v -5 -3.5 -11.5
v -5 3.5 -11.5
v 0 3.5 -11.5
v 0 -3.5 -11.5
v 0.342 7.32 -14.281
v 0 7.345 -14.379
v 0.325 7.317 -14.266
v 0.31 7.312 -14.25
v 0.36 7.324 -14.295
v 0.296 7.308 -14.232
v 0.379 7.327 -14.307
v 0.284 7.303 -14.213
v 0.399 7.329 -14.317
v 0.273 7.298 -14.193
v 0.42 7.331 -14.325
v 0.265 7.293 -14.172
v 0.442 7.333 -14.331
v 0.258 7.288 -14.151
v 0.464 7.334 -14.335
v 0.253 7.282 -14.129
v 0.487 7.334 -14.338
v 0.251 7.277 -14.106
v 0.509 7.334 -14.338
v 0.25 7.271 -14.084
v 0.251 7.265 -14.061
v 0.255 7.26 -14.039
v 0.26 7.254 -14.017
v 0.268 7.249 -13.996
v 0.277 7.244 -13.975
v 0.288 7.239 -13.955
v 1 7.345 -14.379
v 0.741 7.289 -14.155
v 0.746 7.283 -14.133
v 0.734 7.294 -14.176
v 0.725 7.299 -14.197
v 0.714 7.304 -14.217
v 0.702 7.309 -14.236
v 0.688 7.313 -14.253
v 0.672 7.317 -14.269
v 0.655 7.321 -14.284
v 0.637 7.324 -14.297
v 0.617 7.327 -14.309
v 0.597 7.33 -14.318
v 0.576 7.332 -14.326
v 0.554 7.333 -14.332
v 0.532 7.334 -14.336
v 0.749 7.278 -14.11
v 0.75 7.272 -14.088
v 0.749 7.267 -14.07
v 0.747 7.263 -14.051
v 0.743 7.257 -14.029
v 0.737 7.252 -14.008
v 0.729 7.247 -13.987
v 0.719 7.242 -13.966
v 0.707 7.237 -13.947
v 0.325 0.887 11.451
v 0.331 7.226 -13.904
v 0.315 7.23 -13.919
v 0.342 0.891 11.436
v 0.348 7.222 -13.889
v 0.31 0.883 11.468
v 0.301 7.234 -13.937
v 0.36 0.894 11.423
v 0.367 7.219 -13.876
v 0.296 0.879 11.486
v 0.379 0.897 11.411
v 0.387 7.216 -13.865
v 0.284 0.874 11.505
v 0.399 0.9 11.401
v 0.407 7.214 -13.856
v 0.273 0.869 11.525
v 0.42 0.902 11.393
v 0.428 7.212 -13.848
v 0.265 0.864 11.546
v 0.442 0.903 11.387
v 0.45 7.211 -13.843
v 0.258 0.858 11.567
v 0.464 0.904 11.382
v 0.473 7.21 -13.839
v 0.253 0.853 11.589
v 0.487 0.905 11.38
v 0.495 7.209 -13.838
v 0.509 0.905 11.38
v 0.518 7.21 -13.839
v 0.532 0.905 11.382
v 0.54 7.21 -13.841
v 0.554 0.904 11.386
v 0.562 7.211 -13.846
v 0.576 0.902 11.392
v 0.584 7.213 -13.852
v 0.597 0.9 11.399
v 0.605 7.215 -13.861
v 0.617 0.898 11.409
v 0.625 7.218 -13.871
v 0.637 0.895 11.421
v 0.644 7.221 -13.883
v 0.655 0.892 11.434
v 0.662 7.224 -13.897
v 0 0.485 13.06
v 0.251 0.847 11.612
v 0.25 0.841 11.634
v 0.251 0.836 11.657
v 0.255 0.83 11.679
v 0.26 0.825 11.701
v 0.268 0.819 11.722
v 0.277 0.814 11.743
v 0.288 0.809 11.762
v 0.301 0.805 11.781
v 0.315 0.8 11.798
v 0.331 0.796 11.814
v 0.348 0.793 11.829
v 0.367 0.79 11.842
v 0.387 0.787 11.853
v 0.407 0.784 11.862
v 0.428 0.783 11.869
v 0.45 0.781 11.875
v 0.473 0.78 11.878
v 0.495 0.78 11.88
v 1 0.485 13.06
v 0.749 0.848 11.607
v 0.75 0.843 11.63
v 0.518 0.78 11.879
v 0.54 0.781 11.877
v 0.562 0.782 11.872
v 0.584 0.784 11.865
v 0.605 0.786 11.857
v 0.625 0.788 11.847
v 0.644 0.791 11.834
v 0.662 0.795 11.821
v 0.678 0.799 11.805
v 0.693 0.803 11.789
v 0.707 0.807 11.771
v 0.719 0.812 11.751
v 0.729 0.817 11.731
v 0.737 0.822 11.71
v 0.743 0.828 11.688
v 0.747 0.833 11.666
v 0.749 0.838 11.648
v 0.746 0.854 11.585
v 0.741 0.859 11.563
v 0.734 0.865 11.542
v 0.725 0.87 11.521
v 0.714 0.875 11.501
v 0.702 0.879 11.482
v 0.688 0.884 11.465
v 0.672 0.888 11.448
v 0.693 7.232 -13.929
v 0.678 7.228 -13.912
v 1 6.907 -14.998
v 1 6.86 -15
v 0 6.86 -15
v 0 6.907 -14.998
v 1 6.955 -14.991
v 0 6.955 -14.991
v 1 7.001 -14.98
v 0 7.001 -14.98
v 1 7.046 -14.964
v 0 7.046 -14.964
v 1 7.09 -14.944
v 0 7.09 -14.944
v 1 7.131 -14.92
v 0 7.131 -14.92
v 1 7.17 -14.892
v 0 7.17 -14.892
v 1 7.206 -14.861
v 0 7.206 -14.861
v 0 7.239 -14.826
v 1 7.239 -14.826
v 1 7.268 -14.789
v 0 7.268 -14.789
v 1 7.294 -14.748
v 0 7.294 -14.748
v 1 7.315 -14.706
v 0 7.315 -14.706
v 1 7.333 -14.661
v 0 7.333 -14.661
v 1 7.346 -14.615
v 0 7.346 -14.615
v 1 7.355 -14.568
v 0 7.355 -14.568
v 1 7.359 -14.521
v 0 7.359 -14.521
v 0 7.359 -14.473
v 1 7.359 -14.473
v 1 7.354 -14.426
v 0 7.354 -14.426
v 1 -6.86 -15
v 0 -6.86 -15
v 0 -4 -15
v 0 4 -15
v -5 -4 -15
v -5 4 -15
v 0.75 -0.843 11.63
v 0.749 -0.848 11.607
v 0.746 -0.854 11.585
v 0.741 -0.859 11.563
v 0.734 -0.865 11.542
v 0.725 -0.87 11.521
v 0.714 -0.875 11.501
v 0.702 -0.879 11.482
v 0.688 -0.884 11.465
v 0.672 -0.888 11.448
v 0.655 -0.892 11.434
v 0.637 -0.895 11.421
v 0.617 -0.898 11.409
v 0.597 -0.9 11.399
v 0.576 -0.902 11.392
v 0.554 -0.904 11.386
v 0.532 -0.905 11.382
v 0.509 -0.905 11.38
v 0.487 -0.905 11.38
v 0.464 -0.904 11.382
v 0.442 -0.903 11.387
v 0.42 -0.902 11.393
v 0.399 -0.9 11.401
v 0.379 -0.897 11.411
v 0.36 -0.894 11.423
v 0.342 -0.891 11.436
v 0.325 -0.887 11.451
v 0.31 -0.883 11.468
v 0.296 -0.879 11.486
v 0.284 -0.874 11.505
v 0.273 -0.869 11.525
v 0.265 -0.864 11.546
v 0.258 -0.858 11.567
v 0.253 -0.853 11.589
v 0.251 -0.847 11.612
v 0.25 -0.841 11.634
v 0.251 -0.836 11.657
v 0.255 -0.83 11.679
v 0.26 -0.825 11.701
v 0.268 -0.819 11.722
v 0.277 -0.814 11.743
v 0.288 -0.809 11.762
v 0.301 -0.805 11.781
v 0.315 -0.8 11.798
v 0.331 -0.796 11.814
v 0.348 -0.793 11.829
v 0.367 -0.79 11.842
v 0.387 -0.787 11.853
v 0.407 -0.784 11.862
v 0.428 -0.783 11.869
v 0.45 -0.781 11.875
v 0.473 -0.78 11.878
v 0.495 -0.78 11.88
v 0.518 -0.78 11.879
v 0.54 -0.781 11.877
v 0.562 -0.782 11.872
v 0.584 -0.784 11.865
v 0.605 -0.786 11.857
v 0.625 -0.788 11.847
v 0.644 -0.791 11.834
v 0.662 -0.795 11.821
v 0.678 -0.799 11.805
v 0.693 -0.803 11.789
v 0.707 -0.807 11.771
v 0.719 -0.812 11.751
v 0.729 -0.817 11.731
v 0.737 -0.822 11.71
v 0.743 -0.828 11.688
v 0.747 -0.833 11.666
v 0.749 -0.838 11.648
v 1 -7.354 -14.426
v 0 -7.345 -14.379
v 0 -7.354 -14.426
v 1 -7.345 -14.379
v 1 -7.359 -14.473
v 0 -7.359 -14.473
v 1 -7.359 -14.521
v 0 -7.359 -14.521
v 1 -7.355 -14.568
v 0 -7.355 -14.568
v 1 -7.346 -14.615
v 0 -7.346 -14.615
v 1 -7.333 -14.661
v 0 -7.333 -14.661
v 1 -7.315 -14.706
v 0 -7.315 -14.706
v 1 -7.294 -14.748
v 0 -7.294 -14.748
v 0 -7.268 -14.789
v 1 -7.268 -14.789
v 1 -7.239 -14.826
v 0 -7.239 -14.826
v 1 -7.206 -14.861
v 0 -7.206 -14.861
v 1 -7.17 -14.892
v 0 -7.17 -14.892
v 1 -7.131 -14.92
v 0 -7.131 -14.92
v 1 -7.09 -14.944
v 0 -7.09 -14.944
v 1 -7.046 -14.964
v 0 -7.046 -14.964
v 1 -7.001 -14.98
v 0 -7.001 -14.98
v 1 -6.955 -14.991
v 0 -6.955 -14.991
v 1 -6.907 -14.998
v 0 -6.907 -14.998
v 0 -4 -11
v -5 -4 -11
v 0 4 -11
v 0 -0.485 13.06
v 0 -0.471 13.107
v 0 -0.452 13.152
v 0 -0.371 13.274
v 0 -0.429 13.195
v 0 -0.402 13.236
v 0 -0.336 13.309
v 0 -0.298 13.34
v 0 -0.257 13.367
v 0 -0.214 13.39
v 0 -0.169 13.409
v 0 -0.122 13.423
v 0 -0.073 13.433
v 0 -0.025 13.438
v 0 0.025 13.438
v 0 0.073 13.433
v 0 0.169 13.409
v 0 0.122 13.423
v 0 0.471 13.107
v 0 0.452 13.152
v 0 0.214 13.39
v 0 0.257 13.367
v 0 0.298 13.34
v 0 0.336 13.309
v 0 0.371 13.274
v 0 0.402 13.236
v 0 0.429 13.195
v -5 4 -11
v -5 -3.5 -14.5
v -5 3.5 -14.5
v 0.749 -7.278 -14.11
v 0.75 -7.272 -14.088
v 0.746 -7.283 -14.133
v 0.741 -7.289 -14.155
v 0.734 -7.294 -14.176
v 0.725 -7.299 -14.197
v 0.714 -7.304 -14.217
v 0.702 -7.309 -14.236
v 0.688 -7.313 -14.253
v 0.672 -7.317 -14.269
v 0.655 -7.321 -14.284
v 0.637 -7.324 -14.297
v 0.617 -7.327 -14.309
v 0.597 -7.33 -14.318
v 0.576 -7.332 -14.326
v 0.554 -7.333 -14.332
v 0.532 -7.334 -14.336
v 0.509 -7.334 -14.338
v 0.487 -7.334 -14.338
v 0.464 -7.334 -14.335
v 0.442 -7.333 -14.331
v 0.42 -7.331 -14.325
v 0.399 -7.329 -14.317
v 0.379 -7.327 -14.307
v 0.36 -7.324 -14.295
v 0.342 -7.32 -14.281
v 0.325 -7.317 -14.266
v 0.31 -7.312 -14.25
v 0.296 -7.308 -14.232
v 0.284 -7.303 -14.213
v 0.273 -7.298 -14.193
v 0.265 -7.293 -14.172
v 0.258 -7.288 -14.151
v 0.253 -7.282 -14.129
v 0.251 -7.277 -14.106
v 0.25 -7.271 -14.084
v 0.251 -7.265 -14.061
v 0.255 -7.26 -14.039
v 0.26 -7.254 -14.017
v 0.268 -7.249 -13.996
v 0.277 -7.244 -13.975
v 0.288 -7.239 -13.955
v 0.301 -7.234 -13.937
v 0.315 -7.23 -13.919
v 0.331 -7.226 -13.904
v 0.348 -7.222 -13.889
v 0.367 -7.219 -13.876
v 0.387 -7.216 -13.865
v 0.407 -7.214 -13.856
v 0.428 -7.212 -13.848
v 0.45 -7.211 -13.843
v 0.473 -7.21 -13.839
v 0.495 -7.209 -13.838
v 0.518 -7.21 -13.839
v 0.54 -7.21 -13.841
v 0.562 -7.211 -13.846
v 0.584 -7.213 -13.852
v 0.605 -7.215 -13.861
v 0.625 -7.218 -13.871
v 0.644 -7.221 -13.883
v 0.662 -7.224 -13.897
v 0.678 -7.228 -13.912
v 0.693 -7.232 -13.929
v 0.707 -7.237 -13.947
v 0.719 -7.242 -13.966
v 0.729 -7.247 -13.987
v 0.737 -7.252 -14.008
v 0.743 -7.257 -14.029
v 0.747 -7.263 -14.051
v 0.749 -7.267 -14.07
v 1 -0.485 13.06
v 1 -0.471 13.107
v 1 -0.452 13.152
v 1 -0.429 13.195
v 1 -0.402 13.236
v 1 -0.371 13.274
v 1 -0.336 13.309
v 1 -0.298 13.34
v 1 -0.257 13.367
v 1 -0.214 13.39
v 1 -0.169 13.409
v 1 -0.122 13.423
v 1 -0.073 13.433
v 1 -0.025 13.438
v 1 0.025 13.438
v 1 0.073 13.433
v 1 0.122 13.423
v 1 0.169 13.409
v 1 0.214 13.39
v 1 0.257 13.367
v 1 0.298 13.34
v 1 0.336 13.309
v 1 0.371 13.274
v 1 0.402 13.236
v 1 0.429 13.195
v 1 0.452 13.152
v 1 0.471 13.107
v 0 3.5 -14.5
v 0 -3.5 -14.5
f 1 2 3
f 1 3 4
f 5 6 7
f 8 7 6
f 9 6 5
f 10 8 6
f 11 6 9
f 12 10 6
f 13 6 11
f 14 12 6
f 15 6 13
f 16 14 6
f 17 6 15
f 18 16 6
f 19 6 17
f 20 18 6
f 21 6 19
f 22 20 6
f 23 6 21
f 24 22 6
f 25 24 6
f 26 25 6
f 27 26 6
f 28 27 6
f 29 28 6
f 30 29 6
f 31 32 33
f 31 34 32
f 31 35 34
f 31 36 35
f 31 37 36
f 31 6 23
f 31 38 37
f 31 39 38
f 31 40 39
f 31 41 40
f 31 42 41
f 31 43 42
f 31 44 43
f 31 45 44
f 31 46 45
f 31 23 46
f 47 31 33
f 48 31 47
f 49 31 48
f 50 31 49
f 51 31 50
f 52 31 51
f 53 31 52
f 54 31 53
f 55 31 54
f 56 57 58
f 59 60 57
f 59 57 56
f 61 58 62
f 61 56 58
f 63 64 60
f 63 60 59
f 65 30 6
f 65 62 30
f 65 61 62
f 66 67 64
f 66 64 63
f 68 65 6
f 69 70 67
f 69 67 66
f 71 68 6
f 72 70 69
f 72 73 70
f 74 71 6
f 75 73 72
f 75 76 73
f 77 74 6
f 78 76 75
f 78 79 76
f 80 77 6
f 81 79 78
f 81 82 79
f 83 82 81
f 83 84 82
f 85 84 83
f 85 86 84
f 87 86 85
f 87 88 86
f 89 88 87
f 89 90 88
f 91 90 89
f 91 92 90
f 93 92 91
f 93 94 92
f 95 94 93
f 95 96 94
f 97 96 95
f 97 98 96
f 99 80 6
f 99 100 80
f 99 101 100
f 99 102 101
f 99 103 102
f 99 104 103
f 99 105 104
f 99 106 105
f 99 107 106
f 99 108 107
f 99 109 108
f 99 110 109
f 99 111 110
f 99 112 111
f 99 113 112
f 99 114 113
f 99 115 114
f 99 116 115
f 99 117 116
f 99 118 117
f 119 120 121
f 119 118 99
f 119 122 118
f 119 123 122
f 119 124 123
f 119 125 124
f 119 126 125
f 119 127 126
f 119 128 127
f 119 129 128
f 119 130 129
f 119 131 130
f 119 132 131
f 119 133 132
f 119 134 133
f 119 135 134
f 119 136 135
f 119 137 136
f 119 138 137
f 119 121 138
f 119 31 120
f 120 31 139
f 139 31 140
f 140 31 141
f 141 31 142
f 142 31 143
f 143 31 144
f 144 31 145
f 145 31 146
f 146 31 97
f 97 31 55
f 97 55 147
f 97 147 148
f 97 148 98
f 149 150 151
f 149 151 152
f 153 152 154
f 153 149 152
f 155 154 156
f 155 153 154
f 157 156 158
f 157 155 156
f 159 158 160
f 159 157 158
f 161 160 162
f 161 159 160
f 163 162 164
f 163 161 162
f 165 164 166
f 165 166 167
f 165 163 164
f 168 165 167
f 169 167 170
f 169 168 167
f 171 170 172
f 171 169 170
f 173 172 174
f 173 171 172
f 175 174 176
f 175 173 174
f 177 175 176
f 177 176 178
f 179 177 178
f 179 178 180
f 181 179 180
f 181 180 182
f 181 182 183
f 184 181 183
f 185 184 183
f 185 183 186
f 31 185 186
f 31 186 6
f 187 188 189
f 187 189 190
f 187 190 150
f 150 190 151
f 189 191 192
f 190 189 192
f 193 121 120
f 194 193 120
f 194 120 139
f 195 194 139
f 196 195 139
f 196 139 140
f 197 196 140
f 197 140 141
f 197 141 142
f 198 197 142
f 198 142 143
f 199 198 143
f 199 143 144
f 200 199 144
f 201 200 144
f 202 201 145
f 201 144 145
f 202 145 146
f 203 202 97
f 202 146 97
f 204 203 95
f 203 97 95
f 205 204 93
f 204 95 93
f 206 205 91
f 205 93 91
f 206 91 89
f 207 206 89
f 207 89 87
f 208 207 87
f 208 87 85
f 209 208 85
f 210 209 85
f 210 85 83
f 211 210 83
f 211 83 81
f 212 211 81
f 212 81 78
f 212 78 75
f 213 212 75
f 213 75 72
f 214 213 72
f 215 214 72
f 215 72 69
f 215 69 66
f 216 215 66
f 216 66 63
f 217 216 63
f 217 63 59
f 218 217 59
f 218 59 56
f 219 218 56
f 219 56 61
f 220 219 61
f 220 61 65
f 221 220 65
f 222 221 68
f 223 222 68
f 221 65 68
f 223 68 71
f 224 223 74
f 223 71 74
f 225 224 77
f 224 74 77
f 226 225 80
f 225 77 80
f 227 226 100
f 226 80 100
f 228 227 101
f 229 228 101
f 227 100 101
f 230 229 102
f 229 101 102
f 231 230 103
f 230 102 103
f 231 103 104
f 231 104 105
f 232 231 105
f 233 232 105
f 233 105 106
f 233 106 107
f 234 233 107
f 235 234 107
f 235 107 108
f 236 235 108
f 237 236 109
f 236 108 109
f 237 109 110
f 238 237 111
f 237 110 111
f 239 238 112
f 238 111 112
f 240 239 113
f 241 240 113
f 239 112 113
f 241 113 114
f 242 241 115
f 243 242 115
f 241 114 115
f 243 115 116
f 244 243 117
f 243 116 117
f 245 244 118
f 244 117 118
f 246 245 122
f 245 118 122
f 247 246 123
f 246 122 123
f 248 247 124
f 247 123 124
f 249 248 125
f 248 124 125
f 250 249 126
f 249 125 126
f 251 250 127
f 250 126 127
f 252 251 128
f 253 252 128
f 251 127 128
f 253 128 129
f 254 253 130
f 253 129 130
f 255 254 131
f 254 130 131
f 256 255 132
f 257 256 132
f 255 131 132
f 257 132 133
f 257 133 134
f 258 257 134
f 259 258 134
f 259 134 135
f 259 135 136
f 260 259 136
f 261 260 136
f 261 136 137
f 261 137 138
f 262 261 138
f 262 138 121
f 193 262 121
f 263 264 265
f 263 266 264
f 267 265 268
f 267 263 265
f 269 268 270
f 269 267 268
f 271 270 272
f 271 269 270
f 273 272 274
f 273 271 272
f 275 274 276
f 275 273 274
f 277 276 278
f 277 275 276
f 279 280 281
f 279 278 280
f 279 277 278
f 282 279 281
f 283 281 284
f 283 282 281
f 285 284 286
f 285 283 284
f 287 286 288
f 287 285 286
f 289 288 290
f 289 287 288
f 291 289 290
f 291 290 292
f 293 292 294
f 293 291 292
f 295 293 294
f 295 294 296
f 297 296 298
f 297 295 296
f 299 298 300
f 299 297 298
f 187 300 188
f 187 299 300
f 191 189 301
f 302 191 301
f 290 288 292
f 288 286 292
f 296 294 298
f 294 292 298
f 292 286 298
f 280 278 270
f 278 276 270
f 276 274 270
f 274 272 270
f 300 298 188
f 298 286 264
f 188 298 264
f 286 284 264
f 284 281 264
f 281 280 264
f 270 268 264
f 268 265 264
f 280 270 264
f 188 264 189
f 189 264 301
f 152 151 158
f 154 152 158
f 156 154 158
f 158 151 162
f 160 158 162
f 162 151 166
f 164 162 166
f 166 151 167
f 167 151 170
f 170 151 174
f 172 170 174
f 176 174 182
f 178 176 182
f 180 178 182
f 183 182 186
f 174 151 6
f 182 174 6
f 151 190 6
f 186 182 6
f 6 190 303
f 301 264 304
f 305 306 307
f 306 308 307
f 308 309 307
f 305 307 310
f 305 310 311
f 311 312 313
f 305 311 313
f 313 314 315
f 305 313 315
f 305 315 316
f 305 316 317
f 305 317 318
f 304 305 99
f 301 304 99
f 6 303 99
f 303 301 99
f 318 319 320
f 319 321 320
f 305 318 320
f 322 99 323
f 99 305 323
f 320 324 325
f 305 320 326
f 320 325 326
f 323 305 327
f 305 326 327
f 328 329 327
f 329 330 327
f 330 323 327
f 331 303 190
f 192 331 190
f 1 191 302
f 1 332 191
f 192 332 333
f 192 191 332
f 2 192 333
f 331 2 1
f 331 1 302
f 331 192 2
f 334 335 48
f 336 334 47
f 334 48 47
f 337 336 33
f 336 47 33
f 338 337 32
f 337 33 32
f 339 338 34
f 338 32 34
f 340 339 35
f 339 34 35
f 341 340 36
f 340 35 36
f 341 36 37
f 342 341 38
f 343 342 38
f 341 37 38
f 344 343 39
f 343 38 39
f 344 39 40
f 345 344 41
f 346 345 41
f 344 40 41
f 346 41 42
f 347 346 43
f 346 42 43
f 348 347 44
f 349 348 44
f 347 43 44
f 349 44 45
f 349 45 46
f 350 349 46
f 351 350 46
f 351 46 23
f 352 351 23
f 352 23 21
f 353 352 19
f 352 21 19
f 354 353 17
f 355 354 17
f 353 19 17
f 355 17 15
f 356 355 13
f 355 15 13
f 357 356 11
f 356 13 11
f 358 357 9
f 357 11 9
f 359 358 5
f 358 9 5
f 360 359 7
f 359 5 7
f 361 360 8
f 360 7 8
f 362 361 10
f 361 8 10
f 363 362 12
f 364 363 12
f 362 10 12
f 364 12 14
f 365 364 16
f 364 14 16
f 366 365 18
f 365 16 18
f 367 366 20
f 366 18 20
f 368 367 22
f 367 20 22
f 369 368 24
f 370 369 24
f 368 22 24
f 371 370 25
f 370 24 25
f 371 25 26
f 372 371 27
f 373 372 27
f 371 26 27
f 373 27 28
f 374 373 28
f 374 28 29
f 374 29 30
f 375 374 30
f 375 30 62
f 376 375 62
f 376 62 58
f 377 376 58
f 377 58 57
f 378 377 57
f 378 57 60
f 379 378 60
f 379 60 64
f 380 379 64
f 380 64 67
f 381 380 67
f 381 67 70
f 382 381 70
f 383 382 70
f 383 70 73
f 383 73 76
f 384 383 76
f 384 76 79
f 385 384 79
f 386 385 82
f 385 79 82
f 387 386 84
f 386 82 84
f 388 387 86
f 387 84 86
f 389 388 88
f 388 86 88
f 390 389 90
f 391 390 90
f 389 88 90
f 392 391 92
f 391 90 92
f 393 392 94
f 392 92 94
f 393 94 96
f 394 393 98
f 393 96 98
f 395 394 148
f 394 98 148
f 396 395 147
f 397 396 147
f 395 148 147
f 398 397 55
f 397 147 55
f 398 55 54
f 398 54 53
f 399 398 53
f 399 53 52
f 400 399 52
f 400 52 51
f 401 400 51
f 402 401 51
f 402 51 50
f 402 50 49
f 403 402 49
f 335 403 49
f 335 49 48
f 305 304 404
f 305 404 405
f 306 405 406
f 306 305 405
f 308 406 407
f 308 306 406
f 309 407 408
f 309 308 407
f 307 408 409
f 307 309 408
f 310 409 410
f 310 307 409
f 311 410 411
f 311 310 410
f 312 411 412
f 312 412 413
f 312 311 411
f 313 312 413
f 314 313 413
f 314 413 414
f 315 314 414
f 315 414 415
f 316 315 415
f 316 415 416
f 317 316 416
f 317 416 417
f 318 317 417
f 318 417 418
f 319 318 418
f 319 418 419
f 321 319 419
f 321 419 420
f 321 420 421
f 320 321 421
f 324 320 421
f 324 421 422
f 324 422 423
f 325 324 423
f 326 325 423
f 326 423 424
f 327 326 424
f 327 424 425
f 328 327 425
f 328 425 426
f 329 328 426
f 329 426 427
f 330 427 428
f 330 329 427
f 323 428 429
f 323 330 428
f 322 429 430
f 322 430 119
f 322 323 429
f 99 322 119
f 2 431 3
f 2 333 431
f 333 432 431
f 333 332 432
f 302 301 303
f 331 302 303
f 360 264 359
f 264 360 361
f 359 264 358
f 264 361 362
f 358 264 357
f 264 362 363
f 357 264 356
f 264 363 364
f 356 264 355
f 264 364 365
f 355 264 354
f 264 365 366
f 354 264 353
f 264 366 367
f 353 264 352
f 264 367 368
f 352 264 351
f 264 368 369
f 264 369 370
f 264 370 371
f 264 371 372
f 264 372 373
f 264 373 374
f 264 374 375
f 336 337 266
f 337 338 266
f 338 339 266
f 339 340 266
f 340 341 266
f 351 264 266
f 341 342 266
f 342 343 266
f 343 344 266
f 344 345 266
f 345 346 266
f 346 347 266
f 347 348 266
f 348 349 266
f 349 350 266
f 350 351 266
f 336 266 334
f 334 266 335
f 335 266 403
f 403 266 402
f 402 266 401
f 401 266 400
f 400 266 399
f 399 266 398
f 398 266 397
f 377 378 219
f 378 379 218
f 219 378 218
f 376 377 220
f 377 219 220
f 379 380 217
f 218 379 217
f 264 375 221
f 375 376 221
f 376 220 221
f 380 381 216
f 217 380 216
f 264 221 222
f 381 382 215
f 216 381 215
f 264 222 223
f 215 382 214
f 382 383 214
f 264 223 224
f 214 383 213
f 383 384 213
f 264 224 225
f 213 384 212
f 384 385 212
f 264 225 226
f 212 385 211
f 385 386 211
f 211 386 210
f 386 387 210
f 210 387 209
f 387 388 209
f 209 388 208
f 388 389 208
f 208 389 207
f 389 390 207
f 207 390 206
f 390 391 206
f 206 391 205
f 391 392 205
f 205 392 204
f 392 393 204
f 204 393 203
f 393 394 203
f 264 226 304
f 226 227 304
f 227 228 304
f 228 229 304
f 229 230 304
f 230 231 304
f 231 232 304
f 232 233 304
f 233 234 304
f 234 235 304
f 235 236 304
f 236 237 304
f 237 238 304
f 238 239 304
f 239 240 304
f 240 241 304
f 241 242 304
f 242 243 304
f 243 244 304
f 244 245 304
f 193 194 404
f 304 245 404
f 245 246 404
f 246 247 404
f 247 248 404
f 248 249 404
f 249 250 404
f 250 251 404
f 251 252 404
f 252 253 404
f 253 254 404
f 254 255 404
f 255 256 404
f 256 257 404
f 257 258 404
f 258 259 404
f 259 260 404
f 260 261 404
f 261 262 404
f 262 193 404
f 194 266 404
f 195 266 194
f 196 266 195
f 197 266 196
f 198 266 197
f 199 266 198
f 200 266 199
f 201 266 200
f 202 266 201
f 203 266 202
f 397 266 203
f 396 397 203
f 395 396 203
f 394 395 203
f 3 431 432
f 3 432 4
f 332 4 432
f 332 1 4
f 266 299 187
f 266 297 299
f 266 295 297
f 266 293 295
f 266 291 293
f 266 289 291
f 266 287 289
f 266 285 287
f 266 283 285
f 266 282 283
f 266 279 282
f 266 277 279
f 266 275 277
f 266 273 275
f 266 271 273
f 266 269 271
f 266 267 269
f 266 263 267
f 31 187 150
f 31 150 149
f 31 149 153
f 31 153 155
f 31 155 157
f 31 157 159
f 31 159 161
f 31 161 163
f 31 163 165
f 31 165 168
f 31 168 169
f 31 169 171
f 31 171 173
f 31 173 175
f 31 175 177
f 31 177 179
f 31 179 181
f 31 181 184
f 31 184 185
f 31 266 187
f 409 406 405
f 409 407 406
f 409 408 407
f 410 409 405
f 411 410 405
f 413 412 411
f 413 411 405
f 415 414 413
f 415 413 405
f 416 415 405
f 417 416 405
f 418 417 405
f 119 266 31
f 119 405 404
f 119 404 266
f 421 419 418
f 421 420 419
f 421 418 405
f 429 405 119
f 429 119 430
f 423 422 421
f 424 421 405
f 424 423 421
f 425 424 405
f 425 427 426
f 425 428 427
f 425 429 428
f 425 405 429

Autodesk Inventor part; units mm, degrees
ref_plane "YZ Plane" through (0, 0, 0) normal (1, 0, 0) x (0, 1, 0)
ref_plane "XZ Plane" through (0, 0, 0) normal (0, 1, 0) x (-1, 0, 0)
ref_plane "XY Plane" through (0, 0, 0) normal (0, 0, 1) x (1, 0, 0)
sketch "Sketch1" plane through (0, 0, 0) normal (1, 0, 0) x (0, 1, 0)
  line L0 (7.5, 15) -> (-7.5, 15)
  line L1 (-7.5, 15) -> (-7.5, -15)
  line L2 (-7.5, -15) -> (7.5, -15)
  line L3 (7.5, -15) -> (7.5, 15)
  point P0 (0, 0)
  dimension "d0" = 30
  dimension "d1" = 15
  dimension "d2" = 7.5
  dimension "d3" = 15
extrude "Extrusion1" add sketch "Sketch1" along normal blind 1
sketch "Sketch2" plane through (0, 7.5, 15) normal (0, 1, 0) x (1, 0, 0)
  circle A0 centre (0.5, 3.3701) radius 0.25
  circle A1 centre (0.5, 29.0879) radius 0.25
  line L0 (0, 30) -> (0, 0) projected
  point P0 (0, 15)
  dimension "d6" = 0.5
  dimension "d7" = 0.5
  dimension "d8" = 0.5
  dimension "d9" = 0.5
extrude "Extrusion2" cut sketch "Sketch2" against normal blind 20
sketch "Sketch3" plane through (1, 0, 0) normal (1, 0, 0) x (0, 0, -1)
  line L0 (15, 7.5) -> (-15, 0)
  line L1 (-15, 7.5) -> (-15, -7.5) projected
  line L2 (-15, -7.5) -> (15, -7.5) projected
  line L3 (15, -7.5) -> (-15, 0)
  point P0 (0, 0)
extrude "Extrusion3" cut sketch "Sketch3" against normal blind 20
sketch "Sketch4" plane through (1, 0, 0) normal (1, 0, 0) x (0, 0, -1)
  line L0 (-15, 0) -> (15, -7.5) projected
  line L1 (15, 7.5) -> (-15, 0)
  line L2 (-15, 7.5) -> (-15, 0) projected
  line L3 (-15, 0) -> (-15, 7.5)
  line L4 (-15, 7.5) -> (15, 7.5)
  point P0 (0, 0)
extrude "Extrusion4" cut sketch "Sketch4" against normal blind 20
fillet "Fillet1" radius 0.5 3 edges at (0.5, 0, 15) (0.5, 7.5, -15) (0.5, -7.5, -15)
sketch "Sketch5" plane through (0, 0, 0) normal (-1, 0, 0) x (0, 0, 1)
  line L0 (-15, -6.8596) -> (-15, 6.8596) projected
  line L1 (-15, -4) -> (-11, -4)
  line L2 (-11, -4) -> (-11, 4)
  line L3 (-11, 4) -> (-15, 4)
  line L4 (-15, 4) -> (-15, -4)
  line L5 (-14.5, -3.5) -> (-11.5, -3.5)
  line L6 (-11.5, -3.5) -> (-11.5, 3.5)
  line L7 (-11.5, 3.5) -> (-14.5, 3.5)
  line L8 (-14.5, 3.5) -> (-14.5, -3.5)
  point P0 (0, 0)
  dimension "d17" = 8
  dimension "d18" = 4
  dimension "d19" = 4
  dimension "d20" = 7
  dimension "d21" = 3
  dimension "d22" = 0.5
  dimension "d23" = 0.5
extrude "Extrusion5" add sketch "Sketch5" along normal blind 5 contours L0 L3 L2 L1 | L8 L7 L6 L5
sketch "Sketch6" plane through (-5, 0, 0) normal (-1, 0, 0) x (0, 0, 1)
  line L0 (-11.5, -3.5) -> (-14.5, -3.5)
  line L1 (-14.5, -3.5) -> (-14.5, 3.5)
  line L2 (-14.5, 3.5) -> (-11.5, 3.5)
  line L3 (-11.5, 3.5) -> (-11.5, -3.5)
  line L4 (-11, -4) -> (-11, 4) projected
  line L5 (-15, -4) -> (-11, -4) projected
  point P0 (0, 0)
  dimension "d26" = 7
  dimension "d27" = 3
  dimension "d28" = 0.5
  dimension "d29" = 0.5
extrude "Extrusion6" cut sketch "Sketch6" against normal blind 5
equation "\"BendRadius\" = Thickness"
equation "\"BendReliefWidth\" = Thickness"
equation "\"BendReliefDepth\" = 0.5 * Thickness"
equation "\"CornerReliefSize\" = 4 * Thickness"
equation "\"MinimumRemnant\" = 2 * Thickness"
equation "\"TransitionRadius\" = BendRadius"
equation "\"JacobiRadiusSize\" = BendRadius"
equation "\"GapSize\" = Thickness"
equation "\"Thickness\" = 0.5"
properties part number "ت مهمه 3"
